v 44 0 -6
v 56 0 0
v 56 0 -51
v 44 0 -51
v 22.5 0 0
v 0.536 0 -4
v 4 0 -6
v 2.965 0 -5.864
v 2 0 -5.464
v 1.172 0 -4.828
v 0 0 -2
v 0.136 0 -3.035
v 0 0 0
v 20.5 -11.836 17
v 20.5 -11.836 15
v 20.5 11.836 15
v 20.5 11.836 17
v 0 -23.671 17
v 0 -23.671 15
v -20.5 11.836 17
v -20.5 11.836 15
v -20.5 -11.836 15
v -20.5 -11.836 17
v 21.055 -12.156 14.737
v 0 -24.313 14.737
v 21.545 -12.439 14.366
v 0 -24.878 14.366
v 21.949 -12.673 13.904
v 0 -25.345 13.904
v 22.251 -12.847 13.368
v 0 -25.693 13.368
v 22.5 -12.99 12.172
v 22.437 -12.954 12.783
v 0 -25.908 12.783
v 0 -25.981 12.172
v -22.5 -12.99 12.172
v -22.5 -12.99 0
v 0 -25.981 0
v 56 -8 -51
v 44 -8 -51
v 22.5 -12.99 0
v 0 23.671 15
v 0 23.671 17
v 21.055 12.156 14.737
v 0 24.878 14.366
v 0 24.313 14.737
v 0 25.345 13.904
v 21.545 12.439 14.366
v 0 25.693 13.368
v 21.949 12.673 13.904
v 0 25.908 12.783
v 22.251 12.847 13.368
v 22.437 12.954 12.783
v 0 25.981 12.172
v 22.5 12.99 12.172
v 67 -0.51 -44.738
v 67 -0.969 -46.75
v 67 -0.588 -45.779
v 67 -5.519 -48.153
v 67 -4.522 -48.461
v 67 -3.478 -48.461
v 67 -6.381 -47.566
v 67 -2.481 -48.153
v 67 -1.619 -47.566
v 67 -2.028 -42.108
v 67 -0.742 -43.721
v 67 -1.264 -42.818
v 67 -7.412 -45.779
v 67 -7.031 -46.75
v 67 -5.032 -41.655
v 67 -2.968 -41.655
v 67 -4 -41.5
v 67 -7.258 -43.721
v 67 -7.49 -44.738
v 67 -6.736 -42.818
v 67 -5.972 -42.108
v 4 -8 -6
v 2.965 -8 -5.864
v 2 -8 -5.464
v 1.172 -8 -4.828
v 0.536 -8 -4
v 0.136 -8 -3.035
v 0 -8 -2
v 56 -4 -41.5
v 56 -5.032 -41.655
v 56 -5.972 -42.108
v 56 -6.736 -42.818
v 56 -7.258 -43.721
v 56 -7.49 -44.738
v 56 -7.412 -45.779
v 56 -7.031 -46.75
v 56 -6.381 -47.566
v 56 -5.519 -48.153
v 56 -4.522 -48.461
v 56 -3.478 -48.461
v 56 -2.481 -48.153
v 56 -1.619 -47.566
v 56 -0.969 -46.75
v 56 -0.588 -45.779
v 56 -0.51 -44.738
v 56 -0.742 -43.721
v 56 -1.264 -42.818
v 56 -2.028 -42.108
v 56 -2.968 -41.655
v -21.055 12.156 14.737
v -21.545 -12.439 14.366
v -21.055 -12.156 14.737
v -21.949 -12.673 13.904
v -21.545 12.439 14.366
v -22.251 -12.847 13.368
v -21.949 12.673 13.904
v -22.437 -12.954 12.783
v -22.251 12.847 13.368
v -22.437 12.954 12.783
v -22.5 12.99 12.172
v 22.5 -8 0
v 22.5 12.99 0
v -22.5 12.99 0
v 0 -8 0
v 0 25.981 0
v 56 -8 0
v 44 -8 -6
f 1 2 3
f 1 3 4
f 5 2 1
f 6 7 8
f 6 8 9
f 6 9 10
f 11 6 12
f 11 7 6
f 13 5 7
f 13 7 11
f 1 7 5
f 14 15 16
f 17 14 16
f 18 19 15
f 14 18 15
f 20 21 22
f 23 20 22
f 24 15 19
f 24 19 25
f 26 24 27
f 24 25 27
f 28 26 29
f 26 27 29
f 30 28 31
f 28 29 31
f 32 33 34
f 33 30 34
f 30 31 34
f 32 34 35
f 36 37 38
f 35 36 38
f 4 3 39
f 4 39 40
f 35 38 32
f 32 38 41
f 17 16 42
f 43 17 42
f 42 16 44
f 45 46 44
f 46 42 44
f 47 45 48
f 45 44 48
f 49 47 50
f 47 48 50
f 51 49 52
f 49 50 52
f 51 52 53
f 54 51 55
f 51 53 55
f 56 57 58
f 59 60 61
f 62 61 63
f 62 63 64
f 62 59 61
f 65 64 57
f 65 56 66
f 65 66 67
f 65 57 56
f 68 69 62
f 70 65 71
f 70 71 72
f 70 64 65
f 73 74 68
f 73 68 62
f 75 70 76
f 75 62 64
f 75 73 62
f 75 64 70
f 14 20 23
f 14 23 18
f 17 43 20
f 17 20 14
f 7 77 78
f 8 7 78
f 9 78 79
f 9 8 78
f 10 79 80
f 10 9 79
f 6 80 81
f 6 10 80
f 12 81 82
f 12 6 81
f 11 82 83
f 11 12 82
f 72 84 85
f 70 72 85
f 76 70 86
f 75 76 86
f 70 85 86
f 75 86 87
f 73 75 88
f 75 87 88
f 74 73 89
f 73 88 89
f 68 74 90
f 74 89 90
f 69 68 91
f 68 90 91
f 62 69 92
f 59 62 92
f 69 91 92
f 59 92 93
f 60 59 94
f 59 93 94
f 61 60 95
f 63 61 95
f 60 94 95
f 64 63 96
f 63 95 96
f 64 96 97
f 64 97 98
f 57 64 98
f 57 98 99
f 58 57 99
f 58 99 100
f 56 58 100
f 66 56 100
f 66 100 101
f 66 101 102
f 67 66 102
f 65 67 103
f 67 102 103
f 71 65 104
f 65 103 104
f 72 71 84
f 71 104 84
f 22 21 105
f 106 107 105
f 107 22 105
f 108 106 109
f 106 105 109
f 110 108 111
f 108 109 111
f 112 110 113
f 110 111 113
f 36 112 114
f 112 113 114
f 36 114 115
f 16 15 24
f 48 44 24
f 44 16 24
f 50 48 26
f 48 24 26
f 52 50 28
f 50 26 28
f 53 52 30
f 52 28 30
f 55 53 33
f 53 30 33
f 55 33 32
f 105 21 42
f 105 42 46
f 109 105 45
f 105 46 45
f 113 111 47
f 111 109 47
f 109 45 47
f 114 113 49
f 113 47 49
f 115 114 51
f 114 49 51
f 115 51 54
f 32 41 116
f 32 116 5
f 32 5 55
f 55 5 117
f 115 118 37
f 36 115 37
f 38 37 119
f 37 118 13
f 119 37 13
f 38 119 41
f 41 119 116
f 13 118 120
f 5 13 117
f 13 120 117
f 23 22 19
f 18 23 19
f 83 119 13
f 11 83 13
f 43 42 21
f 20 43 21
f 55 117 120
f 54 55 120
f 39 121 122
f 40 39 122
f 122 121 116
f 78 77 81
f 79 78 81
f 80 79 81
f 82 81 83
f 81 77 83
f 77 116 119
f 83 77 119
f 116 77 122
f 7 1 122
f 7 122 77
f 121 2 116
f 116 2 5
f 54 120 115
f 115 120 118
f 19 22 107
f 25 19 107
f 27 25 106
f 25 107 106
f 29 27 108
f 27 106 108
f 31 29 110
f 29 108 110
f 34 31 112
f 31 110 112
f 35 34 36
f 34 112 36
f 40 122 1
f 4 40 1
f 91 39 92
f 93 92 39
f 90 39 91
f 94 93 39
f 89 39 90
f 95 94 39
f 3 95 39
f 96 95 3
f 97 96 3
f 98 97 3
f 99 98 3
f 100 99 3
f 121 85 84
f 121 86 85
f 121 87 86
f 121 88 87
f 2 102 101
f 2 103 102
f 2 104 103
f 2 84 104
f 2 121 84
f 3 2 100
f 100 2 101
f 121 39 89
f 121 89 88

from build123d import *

# Parameters (mm, degrees)
BOSS_EXTRUDE1_DEPTH = 15
BOSS_EXTRUDE2_DEPTH = 2
FILLET1_R           = 3
SKETCH3_W           = 56
SKETCH3_H           = 8
BOSS_EXTRUDE3_DEPTH = 6
SKETCH4_W           = 12
SKETCH4_H           = 8
BOSS_EXTRUDE4_DEPTH = 45
SKETCH5_R           = 3.5
BOSS_EXTRUDE5_DEPTH = 11
FILLET2_R           = 4


with BuildPart() as part:
    # Sketch1 → Boss-Extrude1 (new body)
    with BuildSketch(Plane.XY):
        Polygon((0, 25.980762114), (-22.5, 12.990381057), (-22.5, -12.990381057), (0, -25.980762114), (22.5, -12.990381057), (22.5, 12.990381057), align=None)
    extrude(amount=BOSS_EXTRUDE1_DEPTH)

    # Sketch2 → Boss-Extrude2 (add)
    with BuildSketch(Plane.XY.offset(15)):
        Polygon((20.5, 11.835680518), (0, 23.671361037), (-20.5, 11.835680518), (-20.5, -11.835680518), (0, -23.671361037), (20.5, -11.835680518), align=None)
    extrude(amount=BOSS_EXTRUDE2_DEPTH)

    # Fillet1
    # the kernel refuses this fillet: 3 mm, written as the material it takes off along each edge
    with BuildSketch(Plane(origin=(-22.5, 20.061448869, 15), x_dir=(0, 0, -1), z_dir=(0, -1, 0)), Plane(origin=(28.623724357, 9.454847151, 15), x_dir=(0, 0, -1), z_dir=(-0.8660254037844388, 0.4999999999999997, 0)), Plane(origin=(6.123724357, 29.516296019, 15), x_dir=(0, 0, -1), z_dir=(-0.8660254037844386, -0.5000000000000003, 0))) as fillet1_piece_1:
        with BuildLine():
            CenterArc((2.828427125, 3), FILLET1_R, 199.471220634, 70.528779366)
            Line((0, 2), (-0.056568542, 1.98))
            ThreePointArc((-0.056568542, 1.98), (-0.06, 1), (-0.06, 0))
            Line((-0.06, 0), (0, -0.06))
            Line((0, -0.06), (2.828427125, -0.06))
            Line((2.828427125, -0.06), (2.828427125, 0))
        make_face()
    extrude(amount=40.122897737, mode=Mode.SUBTRACT)
    with BuildSketch(Plane(origin=(-28.623724357, -9.454847151, 15), x_dir=(0.5000000000000002, 0.8660254037844386, 0), z_dir=(0.8660254037844386, -0.5000000000000002, 0)), Plane(origin=(-6.123724357, -29.516296019, 15), x_dir=(-0.5000000000000003, 0.8660254037844386, 0), z_dir=(0.8660254037844385, 0.5000000000000003, 0)), Plane(origin=(22.5, -20.061448869, 15), x_dir=(-1, 0, 0), z_dir=(0, 1, 0))) as fillet1_piece_2:
        with BuildLine():
            CenterArc((3, -2.828427125), FILLET1_R, 109.471220634, 70.528779366)
            Line((0, -2.828427125), (-0.06, -2.828427125))
            Line((-0.06, -2.828427125), (-0.06, 0))
            Line((-0.06, 0), (0, 0.06))
            ThreePointArc((0, 0.06), (1, 0.06), (1.98, 0.056568542))
            Line((1.98, 0.056568542), (2, 0))
        make_face()
    extrude(amount=40.122897737, mode=Mode.SUBTRACT)

    # Sketch3 → Boss-Extrude3 (add)
    with BuildSketch(Plane(origin=(0, 0, 0), x_dir=(-1, 0, 0), z_dir=(0, 0, -1))):
        with Locations((-28, -4)):
            Rectangle(SKETCH3_W, SKETCH3_H)
    extrude(amount=BOSS_EXTRUDE3_DEPTH)

    # Sketch4 → Boss-Extrude4 (add)
    with BuildSketch(Plane(origin=(0, 0, -6), x_dir=(-1, 0, 0), z_dir=(0, 0, -1))):
        with Locations((-50, -4)):
            Rectangle(SKETCH4_W, SKETCH4_H)
    extrude(amount=BOSS_EXTRUDE4_DEPTH)

    # Sketch5 → Boss-Extrude5 (add)
    with BuildSketch(Plane(origin=(56, 0, 0), x_dir=(0, 0, -1), z_dir=(1, 0, 0))):
        with Locations(Location((45, -4, 0), (0, 0, 180))):
            Circle(SKETCH5_R)
    extrude(amount=BOSS_EXTRUDE5_DEPTH)

    # Fillet2
    fillet2_edges = [part.edges().sort_by_distance(p)[0] for p in [
        (0, -4, -6),
    ]]
    fillet(fillet2_edges, radius=FILLET2_R)


solid = part.part
